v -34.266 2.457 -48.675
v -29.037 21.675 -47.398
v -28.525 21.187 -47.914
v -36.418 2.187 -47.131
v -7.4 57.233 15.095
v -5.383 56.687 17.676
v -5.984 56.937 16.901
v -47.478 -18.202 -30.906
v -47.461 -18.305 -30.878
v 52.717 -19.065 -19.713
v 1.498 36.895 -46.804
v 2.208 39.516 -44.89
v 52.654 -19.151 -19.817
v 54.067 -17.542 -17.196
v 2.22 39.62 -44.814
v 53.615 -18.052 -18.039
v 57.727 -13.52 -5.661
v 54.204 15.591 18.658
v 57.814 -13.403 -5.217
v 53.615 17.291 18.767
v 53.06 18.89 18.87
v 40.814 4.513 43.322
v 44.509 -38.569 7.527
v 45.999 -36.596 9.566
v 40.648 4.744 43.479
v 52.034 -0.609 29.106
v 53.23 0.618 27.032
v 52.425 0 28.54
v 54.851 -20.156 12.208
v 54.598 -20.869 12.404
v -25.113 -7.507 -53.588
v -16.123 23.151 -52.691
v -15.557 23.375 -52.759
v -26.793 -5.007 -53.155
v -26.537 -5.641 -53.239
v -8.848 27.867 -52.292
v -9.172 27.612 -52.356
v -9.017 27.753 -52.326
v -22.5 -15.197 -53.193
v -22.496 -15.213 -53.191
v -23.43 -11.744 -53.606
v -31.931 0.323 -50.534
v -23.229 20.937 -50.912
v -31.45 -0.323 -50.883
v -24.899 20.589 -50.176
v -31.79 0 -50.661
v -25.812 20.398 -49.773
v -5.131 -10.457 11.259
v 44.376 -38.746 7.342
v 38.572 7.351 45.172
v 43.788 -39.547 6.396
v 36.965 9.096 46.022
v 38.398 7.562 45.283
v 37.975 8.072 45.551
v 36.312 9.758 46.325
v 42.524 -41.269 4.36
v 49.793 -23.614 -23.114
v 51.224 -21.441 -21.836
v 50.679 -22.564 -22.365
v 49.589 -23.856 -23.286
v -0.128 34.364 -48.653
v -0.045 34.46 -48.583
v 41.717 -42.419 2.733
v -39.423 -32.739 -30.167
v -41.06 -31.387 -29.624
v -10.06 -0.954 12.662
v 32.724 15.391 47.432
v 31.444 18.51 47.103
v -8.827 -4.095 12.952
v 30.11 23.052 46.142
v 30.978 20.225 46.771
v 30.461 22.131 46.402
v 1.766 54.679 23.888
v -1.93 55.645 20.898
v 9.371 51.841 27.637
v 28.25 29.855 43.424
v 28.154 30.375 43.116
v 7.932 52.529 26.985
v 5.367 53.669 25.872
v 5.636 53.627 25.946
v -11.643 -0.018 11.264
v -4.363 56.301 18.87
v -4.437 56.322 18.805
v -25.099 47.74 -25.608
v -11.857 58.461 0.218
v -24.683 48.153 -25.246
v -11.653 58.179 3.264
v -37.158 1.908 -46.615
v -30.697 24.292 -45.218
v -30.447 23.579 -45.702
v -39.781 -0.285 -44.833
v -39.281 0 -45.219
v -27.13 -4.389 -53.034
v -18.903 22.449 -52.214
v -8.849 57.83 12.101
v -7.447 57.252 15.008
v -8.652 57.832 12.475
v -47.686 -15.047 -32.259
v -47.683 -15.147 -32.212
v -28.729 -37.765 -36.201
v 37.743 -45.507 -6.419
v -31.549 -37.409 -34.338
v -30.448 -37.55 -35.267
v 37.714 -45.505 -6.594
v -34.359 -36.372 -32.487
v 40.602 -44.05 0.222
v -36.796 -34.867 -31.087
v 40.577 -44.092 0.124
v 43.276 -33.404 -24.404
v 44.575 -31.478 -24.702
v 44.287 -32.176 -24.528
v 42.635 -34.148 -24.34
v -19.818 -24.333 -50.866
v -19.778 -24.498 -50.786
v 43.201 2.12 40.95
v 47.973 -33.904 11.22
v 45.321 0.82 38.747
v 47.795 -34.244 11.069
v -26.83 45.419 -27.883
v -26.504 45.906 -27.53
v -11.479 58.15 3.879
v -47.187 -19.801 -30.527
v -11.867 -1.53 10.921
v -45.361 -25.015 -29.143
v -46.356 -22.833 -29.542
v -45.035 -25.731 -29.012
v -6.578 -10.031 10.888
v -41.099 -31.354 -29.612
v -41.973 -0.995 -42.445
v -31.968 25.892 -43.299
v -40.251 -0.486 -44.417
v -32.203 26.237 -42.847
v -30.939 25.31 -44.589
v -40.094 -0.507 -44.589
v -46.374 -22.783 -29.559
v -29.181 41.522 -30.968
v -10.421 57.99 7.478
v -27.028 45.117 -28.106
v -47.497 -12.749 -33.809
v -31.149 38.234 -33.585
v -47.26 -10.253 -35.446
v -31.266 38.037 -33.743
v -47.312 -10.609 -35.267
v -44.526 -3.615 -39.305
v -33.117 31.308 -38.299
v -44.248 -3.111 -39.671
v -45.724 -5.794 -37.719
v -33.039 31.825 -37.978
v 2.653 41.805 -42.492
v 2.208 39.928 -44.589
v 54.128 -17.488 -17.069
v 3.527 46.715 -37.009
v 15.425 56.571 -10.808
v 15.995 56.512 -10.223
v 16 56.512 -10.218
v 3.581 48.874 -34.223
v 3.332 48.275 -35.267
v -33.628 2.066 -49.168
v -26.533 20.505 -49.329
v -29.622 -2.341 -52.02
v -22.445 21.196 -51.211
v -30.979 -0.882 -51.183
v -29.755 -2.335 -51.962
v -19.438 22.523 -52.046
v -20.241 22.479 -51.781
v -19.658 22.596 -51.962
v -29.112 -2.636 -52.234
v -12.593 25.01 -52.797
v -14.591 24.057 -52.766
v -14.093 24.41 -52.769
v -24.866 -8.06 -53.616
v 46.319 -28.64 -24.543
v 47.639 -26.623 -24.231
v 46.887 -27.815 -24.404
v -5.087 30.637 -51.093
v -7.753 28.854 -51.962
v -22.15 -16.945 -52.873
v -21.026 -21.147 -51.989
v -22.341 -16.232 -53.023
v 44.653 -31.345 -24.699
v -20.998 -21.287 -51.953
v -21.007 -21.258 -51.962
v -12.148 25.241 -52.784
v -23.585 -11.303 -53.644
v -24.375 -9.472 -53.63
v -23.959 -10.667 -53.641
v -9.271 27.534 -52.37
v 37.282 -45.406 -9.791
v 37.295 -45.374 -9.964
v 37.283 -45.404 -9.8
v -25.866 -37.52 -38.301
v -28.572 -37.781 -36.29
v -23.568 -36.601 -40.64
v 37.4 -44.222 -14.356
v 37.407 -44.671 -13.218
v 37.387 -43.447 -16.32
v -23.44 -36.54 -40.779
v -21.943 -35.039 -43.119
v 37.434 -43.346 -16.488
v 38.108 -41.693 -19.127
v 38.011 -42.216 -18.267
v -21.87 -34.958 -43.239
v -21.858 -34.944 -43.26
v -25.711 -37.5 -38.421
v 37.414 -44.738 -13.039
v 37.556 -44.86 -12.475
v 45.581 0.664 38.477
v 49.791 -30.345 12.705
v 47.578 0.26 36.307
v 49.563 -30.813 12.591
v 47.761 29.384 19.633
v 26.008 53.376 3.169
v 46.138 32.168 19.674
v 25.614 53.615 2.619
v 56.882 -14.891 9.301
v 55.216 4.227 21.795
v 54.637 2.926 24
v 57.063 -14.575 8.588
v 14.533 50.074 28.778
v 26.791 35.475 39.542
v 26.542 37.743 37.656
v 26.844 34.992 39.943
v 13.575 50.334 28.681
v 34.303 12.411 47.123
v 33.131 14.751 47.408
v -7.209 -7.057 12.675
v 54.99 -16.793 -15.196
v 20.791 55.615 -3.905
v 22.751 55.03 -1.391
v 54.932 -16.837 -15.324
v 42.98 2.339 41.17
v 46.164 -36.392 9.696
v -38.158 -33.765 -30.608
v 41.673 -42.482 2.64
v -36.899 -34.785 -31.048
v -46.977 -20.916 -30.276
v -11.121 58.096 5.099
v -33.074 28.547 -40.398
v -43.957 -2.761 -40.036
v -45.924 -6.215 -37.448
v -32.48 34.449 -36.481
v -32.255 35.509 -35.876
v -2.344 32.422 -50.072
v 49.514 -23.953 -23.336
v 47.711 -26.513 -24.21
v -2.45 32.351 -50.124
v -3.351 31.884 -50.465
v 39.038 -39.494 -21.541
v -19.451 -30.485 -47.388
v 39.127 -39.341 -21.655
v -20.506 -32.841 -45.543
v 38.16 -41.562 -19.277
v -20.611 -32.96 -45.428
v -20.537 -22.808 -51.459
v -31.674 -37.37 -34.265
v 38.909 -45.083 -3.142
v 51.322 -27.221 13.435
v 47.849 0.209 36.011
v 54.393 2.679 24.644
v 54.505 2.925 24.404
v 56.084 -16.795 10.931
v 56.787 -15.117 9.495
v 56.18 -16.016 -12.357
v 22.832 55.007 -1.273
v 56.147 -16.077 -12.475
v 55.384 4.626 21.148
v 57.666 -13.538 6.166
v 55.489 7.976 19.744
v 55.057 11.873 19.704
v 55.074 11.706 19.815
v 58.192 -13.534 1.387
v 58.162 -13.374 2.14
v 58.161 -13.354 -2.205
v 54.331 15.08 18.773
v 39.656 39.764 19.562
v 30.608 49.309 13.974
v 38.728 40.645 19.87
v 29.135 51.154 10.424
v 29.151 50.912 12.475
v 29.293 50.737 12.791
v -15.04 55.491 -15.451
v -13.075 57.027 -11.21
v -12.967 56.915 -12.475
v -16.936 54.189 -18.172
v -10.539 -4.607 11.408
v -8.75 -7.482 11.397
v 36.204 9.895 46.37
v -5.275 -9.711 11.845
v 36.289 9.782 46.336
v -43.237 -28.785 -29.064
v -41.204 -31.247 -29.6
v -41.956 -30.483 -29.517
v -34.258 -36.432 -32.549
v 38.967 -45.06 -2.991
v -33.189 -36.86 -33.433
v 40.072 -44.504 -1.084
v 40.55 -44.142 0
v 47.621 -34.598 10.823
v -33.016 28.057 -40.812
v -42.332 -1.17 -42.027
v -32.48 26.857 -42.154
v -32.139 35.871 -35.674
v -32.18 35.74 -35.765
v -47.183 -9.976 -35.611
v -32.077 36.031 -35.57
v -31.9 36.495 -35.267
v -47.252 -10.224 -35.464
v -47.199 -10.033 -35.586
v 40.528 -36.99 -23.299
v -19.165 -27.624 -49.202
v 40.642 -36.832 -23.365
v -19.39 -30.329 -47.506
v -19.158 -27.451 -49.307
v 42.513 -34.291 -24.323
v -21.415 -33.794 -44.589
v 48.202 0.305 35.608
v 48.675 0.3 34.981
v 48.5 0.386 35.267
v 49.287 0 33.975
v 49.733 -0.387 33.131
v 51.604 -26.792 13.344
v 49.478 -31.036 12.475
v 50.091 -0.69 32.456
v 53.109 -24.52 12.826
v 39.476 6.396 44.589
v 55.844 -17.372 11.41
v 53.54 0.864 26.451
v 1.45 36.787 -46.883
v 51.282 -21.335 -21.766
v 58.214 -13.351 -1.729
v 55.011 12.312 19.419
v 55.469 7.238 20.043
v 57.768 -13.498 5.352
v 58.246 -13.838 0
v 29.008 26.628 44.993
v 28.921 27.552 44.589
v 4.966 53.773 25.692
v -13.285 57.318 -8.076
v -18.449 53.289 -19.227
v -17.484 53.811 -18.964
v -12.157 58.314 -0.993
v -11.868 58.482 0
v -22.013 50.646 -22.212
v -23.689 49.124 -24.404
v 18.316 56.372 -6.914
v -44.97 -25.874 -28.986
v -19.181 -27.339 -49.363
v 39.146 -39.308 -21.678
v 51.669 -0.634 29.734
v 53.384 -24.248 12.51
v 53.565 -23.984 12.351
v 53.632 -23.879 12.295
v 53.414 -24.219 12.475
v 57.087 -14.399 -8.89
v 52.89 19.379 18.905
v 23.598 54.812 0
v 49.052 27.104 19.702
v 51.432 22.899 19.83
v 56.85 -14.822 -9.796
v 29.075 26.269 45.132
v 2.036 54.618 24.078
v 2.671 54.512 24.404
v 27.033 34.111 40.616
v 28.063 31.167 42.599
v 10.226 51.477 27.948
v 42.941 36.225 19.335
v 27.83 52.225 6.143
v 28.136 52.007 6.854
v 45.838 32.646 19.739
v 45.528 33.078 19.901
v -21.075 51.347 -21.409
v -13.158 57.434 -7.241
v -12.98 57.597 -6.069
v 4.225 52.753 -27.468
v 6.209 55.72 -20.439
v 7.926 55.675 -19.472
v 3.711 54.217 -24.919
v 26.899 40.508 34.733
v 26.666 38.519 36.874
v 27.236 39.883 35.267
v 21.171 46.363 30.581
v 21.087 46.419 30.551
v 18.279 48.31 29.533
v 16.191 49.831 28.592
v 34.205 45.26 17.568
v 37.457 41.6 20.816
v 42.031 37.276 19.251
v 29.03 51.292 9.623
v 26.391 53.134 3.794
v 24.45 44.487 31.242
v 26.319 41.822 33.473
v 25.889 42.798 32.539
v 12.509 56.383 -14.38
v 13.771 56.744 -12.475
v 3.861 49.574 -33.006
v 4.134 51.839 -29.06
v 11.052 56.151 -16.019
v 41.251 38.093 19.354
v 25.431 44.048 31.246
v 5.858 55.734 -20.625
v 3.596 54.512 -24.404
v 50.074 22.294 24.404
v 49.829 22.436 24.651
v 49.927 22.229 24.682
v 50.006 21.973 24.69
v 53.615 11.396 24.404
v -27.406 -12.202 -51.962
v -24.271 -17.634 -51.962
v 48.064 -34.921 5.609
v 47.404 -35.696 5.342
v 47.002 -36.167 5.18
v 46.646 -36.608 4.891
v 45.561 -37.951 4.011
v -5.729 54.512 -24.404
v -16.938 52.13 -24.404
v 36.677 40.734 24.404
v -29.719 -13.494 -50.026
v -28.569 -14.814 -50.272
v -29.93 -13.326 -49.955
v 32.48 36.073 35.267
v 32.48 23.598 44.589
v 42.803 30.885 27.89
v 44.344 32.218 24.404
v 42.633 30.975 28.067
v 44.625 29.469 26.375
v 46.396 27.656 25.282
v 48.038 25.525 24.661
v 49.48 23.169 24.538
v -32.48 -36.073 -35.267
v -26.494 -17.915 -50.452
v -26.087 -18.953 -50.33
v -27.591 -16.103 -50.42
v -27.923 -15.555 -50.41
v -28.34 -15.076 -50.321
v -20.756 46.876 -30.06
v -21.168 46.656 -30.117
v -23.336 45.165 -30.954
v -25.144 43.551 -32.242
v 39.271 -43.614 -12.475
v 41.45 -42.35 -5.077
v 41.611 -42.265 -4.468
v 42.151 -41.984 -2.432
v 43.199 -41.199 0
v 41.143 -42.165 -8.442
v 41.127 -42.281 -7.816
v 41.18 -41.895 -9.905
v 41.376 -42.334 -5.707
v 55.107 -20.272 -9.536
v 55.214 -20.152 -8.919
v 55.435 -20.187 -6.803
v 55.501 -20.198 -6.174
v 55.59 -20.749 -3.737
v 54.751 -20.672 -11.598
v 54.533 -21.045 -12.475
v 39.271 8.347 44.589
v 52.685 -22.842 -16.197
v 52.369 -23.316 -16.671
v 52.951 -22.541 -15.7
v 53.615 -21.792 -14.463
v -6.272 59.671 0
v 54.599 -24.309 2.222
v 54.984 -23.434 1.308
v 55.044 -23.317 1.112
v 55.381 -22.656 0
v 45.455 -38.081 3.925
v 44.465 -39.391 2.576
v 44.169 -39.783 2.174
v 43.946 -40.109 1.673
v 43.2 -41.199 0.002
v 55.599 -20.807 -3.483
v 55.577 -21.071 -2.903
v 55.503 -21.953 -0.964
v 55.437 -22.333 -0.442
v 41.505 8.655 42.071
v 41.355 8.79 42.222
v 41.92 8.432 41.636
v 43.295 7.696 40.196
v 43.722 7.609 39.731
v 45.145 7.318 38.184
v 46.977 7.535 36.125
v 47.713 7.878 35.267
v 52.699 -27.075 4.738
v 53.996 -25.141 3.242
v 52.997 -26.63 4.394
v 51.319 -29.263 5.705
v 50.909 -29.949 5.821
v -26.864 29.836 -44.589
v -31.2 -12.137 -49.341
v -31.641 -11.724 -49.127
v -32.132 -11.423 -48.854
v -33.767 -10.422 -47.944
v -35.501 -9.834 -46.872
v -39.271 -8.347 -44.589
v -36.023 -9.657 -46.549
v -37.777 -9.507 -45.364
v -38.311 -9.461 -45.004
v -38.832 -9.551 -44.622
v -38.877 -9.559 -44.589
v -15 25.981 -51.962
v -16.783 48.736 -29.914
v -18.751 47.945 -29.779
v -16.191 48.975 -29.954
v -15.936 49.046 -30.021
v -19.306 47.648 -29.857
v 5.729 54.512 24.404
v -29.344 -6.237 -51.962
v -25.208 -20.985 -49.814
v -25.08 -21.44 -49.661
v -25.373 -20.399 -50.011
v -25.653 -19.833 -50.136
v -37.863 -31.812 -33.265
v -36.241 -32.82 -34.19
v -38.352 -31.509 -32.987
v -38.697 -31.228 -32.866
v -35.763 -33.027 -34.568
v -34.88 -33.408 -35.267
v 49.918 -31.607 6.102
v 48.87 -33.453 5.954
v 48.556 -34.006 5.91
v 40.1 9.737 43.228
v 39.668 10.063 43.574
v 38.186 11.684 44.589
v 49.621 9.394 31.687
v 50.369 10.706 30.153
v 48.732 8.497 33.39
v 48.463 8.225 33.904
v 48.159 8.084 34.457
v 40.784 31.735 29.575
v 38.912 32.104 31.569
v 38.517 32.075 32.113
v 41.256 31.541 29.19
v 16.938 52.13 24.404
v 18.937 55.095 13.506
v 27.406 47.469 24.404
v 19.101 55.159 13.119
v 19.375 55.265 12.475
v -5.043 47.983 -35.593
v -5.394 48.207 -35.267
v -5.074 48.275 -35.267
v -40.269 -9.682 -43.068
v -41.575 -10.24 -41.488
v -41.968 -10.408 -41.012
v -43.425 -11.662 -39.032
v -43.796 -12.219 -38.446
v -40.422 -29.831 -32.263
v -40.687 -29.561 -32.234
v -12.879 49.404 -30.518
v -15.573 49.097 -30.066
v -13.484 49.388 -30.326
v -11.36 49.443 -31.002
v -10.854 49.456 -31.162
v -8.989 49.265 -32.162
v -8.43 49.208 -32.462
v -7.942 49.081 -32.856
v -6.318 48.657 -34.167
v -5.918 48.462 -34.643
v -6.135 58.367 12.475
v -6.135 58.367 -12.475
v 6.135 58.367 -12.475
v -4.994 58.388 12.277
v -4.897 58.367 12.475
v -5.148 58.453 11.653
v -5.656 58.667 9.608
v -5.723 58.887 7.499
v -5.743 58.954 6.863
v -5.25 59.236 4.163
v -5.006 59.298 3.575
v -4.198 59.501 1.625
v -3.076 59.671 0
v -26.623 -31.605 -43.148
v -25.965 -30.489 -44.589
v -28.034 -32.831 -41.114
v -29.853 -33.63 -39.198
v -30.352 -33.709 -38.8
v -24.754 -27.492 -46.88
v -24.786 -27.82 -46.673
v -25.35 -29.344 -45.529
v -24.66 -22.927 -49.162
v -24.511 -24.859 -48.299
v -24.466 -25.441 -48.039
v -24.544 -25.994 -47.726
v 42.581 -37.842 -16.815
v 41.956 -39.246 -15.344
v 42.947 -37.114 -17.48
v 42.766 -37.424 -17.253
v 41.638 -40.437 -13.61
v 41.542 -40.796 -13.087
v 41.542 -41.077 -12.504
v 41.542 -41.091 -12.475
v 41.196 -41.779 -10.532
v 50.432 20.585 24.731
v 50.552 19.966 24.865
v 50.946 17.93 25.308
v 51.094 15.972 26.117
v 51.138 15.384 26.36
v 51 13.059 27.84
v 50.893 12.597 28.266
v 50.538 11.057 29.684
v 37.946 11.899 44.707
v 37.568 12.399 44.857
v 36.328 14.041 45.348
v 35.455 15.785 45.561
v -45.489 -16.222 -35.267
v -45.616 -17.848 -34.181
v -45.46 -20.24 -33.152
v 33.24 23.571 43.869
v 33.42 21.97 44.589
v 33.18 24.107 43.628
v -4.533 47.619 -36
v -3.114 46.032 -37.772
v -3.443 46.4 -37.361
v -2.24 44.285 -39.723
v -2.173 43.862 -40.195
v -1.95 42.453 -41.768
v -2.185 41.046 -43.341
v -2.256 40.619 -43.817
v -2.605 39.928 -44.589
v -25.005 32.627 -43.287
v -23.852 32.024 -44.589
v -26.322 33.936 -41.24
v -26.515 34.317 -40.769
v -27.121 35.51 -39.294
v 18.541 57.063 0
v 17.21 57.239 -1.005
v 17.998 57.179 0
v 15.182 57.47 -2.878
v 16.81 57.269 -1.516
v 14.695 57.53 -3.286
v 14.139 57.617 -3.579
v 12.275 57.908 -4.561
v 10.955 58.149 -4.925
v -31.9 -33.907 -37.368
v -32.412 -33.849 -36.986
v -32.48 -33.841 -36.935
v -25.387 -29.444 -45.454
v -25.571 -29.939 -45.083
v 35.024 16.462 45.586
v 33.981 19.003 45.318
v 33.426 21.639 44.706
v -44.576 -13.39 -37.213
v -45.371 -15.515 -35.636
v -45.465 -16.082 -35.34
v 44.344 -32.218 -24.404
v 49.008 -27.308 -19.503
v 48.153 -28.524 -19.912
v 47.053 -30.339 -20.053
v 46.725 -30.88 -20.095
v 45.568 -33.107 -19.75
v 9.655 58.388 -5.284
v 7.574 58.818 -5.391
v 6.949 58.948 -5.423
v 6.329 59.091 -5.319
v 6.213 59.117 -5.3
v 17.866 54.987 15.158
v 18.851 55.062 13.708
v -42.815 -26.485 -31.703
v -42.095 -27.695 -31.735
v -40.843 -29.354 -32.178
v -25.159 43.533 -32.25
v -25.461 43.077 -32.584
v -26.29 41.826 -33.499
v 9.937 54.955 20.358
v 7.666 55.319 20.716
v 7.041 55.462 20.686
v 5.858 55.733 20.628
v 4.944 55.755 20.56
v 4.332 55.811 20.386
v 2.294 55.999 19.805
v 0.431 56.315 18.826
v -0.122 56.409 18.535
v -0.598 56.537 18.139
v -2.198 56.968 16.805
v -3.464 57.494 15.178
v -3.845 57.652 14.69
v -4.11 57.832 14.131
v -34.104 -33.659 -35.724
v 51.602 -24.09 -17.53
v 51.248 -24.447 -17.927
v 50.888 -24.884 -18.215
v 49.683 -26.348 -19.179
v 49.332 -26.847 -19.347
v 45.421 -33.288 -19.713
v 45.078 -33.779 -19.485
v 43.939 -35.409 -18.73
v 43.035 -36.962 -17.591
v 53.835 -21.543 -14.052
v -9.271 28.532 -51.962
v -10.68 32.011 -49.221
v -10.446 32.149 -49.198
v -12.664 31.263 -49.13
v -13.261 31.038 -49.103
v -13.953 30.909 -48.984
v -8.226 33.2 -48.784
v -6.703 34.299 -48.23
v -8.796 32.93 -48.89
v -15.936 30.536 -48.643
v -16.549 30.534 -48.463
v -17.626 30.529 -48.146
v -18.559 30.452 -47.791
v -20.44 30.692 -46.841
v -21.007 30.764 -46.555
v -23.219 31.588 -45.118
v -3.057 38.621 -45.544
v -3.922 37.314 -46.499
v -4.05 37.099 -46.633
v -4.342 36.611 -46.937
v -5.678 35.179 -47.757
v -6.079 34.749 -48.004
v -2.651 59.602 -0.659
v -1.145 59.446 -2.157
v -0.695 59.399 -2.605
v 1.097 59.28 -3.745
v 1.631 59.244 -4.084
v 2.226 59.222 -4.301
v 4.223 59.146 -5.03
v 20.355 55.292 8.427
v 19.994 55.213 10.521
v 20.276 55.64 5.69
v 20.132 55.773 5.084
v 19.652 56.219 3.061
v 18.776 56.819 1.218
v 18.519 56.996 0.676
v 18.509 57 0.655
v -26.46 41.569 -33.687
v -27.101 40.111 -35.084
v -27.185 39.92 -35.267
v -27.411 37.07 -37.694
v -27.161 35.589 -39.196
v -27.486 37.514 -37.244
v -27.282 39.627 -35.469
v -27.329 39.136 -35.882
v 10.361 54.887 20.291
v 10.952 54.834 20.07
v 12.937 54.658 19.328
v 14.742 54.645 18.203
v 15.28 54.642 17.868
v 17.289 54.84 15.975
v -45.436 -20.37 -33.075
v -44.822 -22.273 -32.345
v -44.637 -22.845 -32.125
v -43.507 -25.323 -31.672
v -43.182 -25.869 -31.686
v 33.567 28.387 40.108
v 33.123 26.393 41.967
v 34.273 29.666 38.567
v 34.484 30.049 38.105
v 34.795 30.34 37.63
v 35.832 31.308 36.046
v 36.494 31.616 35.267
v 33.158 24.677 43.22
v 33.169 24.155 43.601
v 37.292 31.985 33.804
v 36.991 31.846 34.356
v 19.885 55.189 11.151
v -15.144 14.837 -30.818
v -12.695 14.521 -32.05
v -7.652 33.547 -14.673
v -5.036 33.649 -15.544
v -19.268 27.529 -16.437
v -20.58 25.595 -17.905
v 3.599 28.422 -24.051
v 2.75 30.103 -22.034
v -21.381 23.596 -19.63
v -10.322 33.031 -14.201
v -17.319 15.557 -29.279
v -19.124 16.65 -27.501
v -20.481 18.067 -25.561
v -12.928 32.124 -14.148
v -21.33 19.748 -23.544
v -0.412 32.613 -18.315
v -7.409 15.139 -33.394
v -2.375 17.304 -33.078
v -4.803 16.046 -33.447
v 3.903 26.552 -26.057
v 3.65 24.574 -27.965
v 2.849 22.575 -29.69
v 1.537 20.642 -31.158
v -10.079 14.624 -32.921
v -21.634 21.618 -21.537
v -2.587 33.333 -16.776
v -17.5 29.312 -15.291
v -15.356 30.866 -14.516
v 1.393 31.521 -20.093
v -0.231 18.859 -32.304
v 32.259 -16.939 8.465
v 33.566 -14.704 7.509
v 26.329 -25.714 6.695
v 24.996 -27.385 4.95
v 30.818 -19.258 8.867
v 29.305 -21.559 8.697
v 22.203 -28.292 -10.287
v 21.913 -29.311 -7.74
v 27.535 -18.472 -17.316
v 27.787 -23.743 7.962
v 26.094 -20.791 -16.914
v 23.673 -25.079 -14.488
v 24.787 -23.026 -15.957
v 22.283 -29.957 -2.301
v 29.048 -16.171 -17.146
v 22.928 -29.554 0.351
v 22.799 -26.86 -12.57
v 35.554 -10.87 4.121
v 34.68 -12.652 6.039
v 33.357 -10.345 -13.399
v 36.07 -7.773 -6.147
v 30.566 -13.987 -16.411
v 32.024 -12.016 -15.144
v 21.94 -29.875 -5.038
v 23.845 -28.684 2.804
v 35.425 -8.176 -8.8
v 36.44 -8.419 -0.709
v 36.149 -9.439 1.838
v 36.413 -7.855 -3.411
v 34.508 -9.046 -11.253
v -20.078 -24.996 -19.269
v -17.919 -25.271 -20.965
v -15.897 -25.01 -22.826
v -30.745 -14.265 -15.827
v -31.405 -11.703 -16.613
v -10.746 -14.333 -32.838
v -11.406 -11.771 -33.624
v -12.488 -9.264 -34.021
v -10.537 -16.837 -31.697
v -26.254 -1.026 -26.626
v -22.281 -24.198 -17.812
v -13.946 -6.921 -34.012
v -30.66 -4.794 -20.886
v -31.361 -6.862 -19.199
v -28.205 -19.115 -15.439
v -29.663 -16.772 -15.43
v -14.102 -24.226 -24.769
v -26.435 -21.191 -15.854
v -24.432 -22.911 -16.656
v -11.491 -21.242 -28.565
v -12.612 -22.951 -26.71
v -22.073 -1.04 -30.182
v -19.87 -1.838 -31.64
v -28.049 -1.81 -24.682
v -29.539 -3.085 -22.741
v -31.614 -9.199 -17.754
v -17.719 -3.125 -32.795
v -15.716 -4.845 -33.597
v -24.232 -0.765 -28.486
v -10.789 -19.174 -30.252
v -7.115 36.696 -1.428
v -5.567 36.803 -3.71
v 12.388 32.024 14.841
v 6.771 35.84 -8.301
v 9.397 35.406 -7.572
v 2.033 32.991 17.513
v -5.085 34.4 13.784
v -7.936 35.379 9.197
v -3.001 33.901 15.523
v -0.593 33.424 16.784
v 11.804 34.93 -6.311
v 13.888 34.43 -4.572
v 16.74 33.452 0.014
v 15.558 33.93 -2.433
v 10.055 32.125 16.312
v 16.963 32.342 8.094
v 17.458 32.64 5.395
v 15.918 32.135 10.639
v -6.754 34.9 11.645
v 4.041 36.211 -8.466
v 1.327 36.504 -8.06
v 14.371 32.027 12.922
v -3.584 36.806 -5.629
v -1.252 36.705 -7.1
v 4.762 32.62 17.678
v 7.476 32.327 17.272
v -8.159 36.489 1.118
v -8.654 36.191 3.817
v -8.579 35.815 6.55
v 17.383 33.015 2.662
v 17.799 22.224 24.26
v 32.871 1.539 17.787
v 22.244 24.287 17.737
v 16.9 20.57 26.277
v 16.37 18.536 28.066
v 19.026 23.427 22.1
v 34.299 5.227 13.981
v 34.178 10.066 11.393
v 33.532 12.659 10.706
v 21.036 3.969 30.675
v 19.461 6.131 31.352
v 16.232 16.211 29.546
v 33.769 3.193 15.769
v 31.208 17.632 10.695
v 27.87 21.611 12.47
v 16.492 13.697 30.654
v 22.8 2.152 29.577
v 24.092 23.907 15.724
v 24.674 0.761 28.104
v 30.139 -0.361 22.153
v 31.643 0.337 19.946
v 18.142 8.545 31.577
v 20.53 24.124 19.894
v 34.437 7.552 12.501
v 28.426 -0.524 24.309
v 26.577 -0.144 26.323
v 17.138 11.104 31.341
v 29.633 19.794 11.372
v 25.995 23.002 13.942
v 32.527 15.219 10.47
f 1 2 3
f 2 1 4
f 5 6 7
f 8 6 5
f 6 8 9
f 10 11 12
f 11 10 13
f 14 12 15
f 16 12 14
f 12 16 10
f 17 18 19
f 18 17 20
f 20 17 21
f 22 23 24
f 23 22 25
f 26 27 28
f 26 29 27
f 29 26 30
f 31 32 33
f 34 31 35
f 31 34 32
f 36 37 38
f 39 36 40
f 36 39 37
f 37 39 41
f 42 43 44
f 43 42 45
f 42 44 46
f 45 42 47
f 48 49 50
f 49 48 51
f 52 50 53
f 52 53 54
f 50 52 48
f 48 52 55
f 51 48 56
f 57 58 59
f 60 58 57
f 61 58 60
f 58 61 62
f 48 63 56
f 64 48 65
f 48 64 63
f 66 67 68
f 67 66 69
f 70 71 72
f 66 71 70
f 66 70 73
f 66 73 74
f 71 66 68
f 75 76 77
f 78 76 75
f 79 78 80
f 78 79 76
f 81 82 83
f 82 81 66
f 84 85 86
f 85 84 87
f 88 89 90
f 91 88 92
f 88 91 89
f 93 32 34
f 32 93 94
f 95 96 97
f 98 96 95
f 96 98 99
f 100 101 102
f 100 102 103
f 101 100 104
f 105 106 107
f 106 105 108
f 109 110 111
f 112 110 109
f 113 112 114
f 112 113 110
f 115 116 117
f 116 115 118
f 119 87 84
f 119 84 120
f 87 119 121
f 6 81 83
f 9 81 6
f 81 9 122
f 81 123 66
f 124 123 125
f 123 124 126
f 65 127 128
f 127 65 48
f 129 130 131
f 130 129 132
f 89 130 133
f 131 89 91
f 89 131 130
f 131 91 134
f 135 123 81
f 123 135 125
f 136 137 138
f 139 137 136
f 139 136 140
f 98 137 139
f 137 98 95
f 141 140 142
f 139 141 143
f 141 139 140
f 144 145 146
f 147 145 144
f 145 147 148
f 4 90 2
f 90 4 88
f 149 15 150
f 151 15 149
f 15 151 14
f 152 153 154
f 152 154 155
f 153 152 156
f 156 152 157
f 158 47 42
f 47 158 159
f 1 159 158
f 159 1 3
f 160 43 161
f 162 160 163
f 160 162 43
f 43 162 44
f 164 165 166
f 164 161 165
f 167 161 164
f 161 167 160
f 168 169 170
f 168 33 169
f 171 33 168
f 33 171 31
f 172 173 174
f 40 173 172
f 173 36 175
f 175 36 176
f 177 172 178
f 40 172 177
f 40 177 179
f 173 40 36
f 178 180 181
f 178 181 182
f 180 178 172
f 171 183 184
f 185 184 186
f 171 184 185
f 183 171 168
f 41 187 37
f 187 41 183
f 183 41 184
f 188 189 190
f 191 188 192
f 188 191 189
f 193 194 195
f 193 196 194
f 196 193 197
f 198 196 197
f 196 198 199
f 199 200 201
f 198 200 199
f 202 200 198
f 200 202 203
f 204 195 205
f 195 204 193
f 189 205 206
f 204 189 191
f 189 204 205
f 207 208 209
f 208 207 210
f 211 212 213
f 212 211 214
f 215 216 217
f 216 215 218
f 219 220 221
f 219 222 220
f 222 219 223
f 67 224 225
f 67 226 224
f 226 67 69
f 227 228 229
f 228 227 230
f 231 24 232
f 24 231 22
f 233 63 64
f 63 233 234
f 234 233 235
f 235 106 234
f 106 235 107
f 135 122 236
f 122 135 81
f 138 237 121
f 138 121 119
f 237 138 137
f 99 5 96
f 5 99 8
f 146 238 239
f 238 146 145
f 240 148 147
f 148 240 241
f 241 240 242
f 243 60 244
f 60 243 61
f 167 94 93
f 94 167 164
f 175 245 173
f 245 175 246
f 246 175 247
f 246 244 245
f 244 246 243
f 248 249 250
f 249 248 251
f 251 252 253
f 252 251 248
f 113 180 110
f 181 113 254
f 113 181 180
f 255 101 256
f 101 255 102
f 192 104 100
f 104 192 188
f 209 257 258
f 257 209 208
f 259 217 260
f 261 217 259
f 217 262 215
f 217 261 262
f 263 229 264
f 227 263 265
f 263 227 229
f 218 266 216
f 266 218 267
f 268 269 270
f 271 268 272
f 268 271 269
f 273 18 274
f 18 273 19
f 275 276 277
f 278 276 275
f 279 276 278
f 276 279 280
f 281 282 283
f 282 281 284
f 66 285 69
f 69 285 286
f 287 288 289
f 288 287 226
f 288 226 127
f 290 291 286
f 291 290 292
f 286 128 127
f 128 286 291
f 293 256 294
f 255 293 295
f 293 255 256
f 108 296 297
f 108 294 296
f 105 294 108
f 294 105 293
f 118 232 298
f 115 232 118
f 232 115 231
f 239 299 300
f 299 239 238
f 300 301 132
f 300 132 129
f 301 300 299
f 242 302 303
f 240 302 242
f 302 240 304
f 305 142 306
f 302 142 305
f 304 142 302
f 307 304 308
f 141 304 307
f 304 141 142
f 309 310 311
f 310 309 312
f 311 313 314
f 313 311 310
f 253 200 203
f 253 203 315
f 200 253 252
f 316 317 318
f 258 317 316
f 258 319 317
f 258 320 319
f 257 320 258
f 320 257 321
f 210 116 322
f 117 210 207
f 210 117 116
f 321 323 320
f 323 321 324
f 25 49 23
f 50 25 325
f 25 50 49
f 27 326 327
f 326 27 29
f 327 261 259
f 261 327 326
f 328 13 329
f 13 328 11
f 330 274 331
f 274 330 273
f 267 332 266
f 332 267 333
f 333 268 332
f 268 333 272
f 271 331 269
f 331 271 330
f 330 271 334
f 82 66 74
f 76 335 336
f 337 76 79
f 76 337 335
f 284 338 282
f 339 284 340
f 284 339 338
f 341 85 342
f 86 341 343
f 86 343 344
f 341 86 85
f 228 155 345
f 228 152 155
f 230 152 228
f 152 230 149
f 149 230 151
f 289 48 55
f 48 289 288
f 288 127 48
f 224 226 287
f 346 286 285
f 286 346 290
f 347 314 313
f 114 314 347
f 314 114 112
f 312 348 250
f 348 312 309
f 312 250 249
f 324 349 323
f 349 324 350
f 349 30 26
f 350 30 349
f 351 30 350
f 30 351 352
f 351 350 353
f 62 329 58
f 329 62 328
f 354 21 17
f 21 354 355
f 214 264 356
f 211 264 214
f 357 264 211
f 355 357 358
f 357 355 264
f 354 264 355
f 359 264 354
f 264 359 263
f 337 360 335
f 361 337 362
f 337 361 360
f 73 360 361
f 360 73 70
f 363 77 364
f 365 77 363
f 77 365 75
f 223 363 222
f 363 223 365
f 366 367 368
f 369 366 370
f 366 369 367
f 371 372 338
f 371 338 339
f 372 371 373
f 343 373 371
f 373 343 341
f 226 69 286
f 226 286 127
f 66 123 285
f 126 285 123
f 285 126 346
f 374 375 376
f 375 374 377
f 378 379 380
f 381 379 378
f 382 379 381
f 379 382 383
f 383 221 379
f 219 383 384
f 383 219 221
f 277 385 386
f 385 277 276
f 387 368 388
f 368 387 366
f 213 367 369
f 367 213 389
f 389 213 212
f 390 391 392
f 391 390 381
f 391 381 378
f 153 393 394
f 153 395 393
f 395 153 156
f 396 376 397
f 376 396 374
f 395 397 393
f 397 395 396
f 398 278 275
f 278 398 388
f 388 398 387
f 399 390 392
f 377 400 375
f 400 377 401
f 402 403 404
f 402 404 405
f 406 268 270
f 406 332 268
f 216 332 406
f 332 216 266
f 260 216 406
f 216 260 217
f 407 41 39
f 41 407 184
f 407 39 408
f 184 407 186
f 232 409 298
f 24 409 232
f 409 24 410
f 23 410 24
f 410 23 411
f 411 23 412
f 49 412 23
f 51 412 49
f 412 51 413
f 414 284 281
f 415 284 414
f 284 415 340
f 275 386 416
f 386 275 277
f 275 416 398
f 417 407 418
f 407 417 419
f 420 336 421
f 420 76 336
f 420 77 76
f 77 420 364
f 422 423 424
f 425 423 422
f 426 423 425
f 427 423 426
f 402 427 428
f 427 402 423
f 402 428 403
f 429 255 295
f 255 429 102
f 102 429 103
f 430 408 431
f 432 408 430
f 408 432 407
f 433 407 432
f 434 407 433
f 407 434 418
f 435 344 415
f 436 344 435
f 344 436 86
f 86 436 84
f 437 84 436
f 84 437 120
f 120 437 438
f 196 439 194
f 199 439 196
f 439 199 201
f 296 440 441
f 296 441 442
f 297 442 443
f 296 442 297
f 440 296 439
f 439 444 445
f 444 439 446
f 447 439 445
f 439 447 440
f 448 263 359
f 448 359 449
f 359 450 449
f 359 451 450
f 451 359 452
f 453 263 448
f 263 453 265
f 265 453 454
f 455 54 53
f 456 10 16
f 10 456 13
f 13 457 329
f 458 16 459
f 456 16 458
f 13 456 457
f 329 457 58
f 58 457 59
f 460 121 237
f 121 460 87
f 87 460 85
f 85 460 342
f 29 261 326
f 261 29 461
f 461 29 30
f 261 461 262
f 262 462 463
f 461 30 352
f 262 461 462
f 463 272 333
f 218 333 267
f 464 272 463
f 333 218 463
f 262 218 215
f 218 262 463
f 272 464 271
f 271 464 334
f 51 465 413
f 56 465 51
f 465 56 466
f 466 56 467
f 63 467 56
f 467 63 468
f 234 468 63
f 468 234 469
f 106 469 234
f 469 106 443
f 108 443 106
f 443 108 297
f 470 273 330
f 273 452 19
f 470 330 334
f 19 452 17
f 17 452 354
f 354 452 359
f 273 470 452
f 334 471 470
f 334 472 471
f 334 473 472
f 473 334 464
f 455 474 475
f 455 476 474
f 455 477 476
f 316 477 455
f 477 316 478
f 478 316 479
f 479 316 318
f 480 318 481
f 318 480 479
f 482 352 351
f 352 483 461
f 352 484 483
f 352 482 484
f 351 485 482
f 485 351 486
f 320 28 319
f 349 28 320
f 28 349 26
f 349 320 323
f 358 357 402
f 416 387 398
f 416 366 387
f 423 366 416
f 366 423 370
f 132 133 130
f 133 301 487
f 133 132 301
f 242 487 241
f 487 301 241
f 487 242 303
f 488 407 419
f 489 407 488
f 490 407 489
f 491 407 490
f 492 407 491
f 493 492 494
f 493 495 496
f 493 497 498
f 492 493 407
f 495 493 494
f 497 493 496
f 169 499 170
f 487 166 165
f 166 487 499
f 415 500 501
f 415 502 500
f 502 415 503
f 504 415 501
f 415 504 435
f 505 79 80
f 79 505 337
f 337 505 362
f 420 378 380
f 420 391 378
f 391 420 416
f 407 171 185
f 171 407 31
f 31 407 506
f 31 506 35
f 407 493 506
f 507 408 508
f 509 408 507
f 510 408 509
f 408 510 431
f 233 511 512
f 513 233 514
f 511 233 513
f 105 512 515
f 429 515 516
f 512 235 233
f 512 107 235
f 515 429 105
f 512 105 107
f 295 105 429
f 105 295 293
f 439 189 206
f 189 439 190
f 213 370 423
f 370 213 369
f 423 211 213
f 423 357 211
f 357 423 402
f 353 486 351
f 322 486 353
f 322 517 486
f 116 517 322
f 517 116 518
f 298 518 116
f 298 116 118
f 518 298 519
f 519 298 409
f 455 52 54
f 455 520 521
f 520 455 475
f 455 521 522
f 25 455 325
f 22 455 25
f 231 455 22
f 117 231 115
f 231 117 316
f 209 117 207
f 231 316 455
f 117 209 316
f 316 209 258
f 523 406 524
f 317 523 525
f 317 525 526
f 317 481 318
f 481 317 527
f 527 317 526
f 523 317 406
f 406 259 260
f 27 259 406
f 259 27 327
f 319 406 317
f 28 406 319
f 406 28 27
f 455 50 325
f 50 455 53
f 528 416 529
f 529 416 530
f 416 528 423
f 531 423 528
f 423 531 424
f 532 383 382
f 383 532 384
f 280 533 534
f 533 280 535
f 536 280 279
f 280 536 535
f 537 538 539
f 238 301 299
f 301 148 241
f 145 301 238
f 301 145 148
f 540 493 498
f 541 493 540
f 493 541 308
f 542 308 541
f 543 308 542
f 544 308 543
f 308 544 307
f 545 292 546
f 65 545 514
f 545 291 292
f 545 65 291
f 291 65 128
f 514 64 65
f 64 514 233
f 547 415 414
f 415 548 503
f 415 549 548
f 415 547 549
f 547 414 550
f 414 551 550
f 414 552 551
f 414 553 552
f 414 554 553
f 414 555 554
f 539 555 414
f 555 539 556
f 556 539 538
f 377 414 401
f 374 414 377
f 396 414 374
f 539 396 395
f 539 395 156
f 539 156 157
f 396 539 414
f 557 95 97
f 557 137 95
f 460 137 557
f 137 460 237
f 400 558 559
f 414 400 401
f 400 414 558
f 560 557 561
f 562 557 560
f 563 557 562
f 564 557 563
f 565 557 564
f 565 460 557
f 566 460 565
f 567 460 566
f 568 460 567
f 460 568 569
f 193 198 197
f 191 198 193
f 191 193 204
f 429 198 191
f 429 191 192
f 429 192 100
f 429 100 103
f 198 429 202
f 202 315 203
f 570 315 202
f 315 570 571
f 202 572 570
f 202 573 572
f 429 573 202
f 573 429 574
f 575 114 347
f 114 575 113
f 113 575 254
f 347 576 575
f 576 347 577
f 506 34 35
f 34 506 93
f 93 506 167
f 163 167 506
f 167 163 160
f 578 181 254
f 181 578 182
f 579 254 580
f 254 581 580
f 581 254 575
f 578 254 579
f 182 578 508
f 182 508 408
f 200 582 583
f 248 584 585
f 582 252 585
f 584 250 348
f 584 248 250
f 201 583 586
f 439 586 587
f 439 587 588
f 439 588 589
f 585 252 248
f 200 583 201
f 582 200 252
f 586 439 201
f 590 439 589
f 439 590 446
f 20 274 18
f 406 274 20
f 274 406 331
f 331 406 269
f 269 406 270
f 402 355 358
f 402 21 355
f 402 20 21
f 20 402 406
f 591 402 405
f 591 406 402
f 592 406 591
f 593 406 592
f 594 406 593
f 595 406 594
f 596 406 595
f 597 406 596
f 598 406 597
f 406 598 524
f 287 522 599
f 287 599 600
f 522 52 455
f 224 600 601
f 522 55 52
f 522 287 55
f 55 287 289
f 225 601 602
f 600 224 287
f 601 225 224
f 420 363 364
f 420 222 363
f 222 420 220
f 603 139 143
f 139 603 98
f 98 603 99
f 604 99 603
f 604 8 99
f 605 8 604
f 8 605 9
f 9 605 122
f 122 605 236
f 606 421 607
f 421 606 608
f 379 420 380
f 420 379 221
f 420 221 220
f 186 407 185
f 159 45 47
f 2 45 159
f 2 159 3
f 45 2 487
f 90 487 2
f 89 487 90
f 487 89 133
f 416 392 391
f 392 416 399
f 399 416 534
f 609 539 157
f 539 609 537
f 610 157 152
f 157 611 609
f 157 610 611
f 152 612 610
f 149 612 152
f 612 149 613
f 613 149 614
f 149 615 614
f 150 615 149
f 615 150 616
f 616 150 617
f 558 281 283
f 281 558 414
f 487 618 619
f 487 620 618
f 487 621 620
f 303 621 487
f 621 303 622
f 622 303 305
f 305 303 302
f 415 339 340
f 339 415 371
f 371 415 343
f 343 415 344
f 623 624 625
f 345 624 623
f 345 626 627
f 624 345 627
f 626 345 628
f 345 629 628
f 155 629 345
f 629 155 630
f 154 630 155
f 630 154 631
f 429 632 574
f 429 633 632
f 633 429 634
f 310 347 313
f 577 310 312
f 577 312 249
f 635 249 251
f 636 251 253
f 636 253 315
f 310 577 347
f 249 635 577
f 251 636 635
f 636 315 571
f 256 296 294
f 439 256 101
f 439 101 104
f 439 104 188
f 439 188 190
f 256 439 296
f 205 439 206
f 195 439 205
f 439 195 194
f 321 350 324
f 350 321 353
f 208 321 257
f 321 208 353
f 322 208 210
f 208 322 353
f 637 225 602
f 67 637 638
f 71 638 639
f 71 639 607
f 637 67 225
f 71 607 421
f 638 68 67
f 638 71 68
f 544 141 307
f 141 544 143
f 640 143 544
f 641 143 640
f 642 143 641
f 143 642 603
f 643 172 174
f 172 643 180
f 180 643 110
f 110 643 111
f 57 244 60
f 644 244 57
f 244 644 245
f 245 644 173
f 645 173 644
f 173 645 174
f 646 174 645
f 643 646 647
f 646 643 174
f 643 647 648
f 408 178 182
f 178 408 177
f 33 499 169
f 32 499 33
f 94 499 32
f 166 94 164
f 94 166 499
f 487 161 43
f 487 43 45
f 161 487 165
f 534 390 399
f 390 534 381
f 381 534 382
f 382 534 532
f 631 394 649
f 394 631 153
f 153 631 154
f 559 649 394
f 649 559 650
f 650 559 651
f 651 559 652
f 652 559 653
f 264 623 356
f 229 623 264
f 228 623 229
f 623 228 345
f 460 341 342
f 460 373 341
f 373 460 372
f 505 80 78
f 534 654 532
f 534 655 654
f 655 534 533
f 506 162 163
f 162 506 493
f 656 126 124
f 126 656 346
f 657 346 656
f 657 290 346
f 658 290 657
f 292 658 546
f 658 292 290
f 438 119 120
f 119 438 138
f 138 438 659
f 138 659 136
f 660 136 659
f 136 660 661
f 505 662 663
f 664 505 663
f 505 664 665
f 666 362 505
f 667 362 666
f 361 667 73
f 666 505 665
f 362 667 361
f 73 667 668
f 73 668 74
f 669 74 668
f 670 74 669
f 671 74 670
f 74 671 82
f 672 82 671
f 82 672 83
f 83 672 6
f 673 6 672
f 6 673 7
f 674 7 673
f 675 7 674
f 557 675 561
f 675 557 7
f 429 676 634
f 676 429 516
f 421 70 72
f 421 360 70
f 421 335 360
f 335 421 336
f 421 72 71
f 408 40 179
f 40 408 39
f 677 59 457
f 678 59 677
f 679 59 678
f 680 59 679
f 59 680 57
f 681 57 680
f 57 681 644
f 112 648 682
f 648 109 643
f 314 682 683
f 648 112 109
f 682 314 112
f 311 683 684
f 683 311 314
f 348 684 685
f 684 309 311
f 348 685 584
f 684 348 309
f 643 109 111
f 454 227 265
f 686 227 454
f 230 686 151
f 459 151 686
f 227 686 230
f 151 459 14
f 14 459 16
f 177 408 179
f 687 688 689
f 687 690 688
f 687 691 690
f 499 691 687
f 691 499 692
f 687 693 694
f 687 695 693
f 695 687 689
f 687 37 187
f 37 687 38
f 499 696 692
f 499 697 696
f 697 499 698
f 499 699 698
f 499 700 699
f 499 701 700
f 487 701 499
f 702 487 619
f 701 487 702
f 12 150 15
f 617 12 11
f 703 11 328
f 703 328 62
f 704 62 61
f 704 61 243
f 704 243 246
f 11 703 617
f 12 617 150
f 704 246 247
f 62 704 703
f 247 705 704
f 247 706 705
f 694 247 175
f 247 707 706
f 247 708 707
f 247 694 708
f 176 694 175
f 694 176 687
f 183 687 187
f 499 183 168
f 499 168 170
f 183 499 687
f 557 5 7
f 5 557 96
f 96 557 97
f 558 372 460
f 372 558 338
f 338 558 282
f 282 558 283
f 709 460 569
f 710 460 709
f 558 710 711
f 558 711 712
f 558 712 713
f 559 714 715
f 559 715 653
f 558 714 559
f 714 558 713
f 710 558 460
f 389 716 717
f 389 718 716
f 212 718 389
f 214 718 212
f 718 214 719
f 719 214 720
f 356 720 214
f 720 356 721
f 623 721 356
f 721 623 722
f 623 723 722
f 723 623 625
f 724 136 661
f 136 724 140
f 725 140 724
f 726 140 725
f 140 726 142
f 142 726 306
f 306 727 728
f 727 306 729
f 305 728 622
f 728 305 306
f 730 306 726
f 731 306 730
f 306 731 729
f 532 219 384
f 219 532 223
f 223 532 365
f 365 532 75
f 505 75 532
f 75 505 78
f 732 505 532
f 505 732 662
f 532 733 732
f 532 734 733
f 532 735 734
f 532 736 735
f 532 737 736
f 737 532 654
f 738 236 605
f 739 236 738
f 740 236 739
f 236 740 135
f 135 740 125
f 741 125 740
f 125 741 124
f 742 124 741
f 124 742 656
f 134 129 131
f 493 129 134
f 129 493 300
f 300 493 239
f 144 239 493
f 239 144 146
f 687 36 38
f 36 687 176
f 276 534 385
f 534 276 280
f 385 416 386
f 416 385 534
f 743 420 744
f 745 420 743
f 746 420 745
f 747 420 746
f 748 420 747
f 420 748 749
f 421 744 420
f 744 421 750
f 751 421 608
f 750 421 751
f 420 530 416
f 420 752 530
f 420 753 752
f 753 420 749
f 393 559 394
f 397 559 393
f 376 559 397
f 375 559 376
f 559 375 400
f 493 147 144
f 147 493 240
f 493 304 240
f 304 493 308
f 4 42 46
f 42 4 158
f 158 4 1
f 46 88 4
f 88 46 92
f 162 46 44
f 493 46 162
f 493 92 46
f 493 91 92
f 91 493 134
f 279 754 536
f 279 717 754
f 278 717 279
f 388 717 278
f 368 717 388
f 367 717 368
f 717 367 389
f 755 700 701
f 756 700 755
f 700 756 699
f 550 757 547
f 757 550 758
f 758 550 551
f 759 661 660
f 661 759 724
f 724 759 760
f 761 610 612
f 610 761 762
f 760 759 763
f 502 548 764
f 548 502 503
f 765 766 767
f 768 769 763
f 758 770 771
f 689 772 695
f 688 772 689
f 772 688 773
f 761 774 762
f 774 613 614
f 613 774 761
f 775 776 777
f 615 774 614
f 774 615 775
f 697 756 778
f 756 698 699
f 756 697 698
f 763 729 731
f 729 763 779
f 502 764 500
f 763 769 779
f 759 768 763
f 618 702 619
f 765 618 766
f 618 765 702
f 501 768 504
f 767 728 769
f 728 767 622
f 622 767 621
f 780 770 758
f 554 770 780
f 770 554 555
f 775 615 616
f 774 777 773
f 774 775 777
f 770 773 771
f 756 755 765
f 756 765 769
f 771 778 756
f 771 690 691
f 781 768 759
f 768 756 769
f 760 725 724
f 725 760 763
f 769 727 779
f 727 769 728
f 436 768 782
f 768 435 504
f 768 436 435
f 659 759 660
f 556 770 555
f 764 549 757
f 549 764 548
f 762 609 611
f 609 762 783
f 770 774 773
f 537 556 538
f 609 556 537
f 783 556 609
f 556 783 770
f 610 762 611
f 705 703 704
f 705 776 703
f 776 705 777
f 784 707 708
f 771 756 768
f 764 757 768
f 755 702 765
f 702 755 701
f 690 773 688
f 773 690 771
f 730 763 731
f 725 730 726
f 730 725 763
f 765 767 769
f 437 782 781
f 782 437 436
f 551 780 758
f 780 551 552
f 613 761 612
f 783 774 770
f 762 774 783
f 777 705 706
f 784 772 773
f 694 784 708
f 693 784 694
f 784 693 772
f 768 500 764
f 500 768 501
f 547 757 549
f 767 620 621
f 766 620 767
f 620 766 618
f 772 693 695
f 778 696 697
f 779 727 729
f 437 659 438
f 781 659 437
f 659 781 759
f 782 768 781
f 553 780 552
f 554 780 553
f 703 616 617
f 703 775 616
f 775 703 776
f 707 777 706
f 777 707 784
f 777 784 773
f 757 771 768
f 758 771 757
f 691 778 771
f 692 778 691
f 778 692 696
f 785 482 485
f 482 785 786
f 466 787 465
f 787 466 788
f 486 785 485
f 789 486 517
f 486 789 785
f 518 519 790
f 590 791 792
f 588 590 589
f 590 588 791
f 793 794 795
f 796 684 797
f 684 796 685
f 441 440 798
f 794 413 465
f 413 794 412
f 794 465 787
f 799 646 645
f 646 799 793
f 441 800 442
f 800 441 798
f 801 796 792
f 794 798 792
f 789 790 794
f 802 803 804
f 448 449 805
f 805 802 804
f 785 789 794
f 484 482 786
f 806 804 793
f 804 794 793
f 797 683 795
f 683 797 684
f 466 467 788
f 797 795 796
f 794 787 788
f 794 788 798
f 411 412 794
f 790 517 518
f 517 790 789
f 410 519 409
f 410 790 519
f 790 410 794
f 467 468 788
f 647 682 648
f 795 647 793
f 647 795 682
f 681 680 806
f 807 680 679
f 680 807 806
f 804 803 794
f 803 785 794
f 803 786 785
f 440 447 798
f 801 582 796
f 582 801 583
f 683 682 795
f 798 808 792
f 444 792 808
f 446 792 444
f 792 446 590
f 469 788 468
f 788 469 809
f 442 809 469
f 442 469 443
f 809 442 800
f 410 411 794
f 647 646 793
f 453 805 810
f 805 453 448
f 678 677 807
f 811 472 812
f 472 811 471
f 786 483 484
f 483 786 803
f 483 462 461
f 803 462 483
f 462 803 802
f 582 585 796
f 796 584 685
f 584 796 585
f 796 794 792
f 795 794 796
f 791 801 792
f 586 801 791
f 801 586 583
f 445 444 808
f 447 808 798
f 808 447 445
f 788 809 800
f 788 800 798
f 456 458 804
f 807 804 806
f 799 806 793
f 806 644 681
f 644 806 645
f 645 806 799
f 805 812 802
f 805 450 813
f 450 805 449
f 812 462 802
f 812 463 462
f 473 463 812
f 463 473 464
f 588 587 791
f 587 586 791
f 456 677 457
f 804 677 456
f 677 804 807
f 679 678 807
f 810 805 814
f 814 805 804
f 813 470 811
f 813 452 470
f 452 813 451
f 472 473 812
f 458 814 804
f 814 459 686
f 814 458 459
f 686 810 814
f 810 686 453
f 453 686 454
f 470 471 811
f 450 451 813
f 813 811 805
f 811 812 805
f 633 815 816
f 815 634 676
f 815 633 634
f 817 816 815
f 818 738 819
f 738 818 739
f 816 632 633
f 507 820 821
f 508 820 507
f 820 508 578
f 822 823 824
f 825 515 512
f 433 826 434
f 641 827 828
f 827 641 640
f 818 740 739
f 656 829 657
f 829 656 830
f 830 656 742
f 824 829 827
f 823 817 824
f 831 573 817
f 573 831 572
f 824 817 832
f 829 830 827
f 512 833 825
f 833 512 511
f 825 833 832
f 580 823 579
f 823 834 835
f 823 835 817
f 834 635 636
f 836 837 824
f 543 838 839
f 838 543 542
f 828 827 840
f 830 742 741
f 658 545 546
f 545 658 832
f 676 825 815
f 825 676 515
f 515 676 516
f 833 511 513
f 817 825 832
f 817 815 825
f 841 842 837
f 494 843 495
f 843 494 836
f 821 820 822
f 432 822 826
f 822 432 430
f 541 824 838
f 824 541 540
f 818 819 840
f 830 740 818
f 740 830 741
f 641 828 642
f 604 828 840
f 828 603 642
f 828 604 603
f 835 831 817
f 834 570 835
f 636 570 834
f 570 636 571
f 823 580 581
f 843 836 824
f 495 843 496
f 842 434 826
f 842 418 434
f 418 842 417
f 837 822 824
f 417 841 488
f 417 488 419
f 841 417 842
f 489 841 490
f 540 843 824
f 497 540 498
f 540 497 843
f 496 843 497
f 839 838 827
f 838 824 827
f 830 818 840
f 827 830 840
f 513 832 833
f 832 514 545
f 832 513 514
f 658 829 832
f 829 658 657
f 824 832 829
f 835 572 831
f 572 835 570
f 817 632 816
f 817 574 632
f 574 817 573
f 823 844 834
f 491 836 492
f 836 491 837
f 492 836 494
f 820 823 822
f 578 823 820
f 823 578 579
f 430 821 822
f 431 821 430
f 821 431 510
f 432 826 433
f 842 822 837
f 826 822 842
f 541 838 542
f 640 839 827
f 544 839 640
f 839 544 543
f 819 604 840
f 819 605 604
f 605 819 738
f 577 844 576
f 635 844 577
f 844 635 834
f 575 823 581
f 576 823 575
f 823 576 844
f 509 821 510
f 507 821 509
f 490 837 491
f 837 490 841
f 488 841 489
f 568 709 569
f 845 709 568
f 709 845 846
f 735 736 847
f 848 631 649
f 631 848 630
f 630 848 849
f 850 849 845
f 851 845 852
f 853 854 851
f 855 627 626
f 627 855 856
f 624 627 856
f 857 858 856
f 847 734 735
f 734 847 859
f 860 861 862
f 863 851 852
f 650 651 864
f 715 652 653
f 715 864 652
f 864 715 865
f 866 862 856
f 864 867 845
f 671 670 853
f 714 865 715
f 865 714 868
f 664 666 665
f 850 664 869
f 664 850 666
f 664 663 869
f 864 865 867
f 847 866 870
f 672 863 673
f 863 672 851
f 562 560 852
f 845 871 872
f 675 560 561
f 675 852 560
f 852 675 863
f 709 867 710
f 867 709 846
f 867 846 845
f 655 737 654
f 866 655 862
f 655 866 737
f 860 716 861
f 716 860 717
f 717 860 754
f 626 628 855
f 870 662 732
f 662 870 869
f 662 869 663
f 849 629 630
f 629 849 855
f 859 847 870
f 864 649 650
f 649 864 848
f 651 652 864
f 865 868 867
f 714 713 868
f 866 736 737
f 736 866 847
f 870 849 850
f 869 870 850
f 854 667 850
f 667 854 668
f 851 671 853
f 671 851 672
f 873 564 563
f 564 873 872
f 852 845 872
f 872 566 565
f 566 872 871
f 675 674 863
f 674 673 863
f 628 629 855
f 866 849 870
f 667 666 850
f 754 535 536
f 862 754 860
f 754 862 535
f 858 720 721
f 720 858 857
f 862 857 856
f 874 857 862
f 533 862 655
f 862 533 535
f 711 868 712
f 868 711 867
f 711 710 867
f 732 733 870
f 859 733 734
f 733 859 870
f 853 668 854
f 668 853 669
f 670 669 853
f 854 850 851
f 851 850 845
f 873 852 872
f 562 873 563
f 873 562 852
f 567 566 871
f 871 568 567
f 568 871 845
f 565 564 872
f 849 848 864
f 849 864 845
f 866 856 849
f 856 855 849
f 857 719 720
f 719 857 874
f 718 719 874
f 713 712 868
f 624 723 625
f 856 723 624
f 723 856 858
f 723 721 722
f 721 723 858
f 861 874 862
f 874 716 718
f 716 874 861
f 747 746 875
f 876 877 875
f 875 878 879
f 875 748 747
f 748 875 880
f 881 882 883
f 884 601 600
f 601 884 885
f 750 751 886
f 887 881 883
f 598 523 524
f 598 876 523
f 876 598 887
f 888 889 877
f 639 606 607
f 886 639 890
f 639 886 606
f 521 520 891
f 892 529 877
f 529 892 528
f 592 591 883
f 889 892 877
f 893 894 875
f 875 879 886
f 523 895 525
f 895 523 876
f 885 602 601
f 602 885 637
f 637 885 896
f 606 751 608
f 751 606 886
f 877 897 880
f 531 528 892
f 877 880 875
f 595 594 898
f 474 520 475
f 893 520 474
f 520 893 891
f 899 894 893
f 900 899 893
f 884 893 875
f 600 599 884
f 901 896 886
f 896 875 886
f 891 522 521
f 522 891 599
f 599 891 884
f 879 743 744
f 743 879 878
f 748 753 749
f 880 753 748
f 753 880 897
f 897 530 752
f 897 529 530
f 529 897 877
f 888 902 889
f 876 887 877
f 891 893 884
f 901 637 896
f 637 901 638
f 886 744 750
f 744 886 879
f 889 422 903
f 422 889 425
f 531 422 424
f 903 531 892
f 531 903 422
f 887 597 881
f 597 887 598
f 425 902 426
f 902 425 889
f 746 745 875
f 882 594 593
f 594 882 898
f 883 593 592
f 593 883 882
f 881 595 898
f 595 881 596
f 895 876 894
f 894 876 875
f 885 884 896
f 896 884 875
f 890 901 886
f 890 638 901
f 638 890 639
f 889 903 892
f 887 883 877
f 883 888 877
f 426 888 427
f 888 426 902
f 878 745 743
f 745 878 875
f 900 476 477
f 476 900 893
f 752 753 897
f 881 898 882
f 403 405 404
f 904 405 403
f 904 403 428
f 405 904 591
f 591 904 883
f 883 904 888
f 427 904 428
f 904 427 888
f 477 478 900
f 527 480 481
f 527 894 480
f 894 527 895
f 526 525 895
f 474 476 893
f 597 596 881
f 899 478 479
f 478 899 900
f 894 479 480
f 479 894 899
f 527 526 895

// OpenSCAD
difference() {
	intersection() {
		hull() {
			rotate(a = -120.3141209556, v = [-0.6897763572, 0.5190815997, 0.0000000000]) {
				rotate(a = -90.0000000000, v = [-0.2588190451, 0.9659258263, 0.0000000000]) {
					cylinder(h = 60, r = 16.2000000000);
				}
			}
			rotate(a = -120.3141209556, v = [-0.6897763572, 0.5190815997, 0.0000000000]) {
				rotate(a = -90.0000000000, v = [-0.7071067812, -0.7071067812, 0.0000000000]) {
					cylinder(h = 60, r = 16.2000000000);
				}
			}
			rotate(a = -120.3141209556, v = [-0.6897763572, 0.5190815997, 0.0000000000]) {
				rotate(a = -22.2263282801, v = [-0.0665799897, 0.3723606073, 0.0000000000]) {
					cylinder(h = 60, r = 16.2000000000);
				}
			}
			rotate(a = -120.3141209556, v = [-0.6897763572, 0.5190815997, 0.0000000000]) {
				rotate(a = -144.0917087294, v = [0.0385041896, 0.5852242691, -0.0000000000]) {
					cylinder(h = 60, r = 16.2000000000);
				}
			}
			rotate(a = -120.3141209556, v = [-0.6897763572, 0.5190815997, 0.0000000000]) {
				rotate(a = -155.9342565737, v = [-0.0956376174, -0.3964110704, 0.0000000000]) {
					cylinder(h = 60, r = 16.2000000000);
				}
			}
		}
		sphere(r = 60);
	}
	union() {
		rotate(a = -120.3141209556, v = [-0.6897763572, 0.5190815997, 0.0000000000]) {
			rotate(a = -90.0000000000, v = [-0.2588190451, 0.9659258263, 0.0000000000]) {
				translate(v = [0, 0, 35]) {
					cylinder(h = 100, r = 13.2000000000);
				}
			}
		}
		rotate(a = -120.3141209556, v = [-0.6897763572, 0.5190815997, 0.0000000000]) {
			rotate(a = -90.0000000000, v = [-0.7071067812, -0.7071067812, 0.0000000000]) {
				translate(v = [0, 0, 35]) {
					cylinder(h = 100, r = 13.2000000000);
				}
			}
		}
		rotate(a = -120.3141209556, v = [-0.6897763572, 0.5190815997, 0.0000000000]) {
			rotate(a = -22.2263282801, v = [-0.0665799897, 0.3723606073, 0.0000000000]) {
				translate(v = [0, 0, 35]) {
					cylinder(h = 100, r = 13.2000000000);
				}
			}
		}
		rotate(a = -120.3141209556, v = [-0.6897763572, 0.5190815997, 0.0000000000]) {
			rotate(a = -144.0917087294, v = [0.0385041896, 0.5852242691, -0.0000000000]) {
				translate(v = [0, 0, 35]) {
					cylinder(h = 100, r = 13.2000000000);
				}
			}
		}
		rotate(a = -120.3141209556, v = [-0.6897763572, 0.5190815997, 0.0000000000]) {
			rotate(a = -155.9342565737, v = [-0.0956376174, -0.3964110704, 0.0000000000]) {
				translate(v = [0, 0, 35]) {
					cylinder(h = 100, r = 13.2000000000);
				}
			}
		}
	}
}
